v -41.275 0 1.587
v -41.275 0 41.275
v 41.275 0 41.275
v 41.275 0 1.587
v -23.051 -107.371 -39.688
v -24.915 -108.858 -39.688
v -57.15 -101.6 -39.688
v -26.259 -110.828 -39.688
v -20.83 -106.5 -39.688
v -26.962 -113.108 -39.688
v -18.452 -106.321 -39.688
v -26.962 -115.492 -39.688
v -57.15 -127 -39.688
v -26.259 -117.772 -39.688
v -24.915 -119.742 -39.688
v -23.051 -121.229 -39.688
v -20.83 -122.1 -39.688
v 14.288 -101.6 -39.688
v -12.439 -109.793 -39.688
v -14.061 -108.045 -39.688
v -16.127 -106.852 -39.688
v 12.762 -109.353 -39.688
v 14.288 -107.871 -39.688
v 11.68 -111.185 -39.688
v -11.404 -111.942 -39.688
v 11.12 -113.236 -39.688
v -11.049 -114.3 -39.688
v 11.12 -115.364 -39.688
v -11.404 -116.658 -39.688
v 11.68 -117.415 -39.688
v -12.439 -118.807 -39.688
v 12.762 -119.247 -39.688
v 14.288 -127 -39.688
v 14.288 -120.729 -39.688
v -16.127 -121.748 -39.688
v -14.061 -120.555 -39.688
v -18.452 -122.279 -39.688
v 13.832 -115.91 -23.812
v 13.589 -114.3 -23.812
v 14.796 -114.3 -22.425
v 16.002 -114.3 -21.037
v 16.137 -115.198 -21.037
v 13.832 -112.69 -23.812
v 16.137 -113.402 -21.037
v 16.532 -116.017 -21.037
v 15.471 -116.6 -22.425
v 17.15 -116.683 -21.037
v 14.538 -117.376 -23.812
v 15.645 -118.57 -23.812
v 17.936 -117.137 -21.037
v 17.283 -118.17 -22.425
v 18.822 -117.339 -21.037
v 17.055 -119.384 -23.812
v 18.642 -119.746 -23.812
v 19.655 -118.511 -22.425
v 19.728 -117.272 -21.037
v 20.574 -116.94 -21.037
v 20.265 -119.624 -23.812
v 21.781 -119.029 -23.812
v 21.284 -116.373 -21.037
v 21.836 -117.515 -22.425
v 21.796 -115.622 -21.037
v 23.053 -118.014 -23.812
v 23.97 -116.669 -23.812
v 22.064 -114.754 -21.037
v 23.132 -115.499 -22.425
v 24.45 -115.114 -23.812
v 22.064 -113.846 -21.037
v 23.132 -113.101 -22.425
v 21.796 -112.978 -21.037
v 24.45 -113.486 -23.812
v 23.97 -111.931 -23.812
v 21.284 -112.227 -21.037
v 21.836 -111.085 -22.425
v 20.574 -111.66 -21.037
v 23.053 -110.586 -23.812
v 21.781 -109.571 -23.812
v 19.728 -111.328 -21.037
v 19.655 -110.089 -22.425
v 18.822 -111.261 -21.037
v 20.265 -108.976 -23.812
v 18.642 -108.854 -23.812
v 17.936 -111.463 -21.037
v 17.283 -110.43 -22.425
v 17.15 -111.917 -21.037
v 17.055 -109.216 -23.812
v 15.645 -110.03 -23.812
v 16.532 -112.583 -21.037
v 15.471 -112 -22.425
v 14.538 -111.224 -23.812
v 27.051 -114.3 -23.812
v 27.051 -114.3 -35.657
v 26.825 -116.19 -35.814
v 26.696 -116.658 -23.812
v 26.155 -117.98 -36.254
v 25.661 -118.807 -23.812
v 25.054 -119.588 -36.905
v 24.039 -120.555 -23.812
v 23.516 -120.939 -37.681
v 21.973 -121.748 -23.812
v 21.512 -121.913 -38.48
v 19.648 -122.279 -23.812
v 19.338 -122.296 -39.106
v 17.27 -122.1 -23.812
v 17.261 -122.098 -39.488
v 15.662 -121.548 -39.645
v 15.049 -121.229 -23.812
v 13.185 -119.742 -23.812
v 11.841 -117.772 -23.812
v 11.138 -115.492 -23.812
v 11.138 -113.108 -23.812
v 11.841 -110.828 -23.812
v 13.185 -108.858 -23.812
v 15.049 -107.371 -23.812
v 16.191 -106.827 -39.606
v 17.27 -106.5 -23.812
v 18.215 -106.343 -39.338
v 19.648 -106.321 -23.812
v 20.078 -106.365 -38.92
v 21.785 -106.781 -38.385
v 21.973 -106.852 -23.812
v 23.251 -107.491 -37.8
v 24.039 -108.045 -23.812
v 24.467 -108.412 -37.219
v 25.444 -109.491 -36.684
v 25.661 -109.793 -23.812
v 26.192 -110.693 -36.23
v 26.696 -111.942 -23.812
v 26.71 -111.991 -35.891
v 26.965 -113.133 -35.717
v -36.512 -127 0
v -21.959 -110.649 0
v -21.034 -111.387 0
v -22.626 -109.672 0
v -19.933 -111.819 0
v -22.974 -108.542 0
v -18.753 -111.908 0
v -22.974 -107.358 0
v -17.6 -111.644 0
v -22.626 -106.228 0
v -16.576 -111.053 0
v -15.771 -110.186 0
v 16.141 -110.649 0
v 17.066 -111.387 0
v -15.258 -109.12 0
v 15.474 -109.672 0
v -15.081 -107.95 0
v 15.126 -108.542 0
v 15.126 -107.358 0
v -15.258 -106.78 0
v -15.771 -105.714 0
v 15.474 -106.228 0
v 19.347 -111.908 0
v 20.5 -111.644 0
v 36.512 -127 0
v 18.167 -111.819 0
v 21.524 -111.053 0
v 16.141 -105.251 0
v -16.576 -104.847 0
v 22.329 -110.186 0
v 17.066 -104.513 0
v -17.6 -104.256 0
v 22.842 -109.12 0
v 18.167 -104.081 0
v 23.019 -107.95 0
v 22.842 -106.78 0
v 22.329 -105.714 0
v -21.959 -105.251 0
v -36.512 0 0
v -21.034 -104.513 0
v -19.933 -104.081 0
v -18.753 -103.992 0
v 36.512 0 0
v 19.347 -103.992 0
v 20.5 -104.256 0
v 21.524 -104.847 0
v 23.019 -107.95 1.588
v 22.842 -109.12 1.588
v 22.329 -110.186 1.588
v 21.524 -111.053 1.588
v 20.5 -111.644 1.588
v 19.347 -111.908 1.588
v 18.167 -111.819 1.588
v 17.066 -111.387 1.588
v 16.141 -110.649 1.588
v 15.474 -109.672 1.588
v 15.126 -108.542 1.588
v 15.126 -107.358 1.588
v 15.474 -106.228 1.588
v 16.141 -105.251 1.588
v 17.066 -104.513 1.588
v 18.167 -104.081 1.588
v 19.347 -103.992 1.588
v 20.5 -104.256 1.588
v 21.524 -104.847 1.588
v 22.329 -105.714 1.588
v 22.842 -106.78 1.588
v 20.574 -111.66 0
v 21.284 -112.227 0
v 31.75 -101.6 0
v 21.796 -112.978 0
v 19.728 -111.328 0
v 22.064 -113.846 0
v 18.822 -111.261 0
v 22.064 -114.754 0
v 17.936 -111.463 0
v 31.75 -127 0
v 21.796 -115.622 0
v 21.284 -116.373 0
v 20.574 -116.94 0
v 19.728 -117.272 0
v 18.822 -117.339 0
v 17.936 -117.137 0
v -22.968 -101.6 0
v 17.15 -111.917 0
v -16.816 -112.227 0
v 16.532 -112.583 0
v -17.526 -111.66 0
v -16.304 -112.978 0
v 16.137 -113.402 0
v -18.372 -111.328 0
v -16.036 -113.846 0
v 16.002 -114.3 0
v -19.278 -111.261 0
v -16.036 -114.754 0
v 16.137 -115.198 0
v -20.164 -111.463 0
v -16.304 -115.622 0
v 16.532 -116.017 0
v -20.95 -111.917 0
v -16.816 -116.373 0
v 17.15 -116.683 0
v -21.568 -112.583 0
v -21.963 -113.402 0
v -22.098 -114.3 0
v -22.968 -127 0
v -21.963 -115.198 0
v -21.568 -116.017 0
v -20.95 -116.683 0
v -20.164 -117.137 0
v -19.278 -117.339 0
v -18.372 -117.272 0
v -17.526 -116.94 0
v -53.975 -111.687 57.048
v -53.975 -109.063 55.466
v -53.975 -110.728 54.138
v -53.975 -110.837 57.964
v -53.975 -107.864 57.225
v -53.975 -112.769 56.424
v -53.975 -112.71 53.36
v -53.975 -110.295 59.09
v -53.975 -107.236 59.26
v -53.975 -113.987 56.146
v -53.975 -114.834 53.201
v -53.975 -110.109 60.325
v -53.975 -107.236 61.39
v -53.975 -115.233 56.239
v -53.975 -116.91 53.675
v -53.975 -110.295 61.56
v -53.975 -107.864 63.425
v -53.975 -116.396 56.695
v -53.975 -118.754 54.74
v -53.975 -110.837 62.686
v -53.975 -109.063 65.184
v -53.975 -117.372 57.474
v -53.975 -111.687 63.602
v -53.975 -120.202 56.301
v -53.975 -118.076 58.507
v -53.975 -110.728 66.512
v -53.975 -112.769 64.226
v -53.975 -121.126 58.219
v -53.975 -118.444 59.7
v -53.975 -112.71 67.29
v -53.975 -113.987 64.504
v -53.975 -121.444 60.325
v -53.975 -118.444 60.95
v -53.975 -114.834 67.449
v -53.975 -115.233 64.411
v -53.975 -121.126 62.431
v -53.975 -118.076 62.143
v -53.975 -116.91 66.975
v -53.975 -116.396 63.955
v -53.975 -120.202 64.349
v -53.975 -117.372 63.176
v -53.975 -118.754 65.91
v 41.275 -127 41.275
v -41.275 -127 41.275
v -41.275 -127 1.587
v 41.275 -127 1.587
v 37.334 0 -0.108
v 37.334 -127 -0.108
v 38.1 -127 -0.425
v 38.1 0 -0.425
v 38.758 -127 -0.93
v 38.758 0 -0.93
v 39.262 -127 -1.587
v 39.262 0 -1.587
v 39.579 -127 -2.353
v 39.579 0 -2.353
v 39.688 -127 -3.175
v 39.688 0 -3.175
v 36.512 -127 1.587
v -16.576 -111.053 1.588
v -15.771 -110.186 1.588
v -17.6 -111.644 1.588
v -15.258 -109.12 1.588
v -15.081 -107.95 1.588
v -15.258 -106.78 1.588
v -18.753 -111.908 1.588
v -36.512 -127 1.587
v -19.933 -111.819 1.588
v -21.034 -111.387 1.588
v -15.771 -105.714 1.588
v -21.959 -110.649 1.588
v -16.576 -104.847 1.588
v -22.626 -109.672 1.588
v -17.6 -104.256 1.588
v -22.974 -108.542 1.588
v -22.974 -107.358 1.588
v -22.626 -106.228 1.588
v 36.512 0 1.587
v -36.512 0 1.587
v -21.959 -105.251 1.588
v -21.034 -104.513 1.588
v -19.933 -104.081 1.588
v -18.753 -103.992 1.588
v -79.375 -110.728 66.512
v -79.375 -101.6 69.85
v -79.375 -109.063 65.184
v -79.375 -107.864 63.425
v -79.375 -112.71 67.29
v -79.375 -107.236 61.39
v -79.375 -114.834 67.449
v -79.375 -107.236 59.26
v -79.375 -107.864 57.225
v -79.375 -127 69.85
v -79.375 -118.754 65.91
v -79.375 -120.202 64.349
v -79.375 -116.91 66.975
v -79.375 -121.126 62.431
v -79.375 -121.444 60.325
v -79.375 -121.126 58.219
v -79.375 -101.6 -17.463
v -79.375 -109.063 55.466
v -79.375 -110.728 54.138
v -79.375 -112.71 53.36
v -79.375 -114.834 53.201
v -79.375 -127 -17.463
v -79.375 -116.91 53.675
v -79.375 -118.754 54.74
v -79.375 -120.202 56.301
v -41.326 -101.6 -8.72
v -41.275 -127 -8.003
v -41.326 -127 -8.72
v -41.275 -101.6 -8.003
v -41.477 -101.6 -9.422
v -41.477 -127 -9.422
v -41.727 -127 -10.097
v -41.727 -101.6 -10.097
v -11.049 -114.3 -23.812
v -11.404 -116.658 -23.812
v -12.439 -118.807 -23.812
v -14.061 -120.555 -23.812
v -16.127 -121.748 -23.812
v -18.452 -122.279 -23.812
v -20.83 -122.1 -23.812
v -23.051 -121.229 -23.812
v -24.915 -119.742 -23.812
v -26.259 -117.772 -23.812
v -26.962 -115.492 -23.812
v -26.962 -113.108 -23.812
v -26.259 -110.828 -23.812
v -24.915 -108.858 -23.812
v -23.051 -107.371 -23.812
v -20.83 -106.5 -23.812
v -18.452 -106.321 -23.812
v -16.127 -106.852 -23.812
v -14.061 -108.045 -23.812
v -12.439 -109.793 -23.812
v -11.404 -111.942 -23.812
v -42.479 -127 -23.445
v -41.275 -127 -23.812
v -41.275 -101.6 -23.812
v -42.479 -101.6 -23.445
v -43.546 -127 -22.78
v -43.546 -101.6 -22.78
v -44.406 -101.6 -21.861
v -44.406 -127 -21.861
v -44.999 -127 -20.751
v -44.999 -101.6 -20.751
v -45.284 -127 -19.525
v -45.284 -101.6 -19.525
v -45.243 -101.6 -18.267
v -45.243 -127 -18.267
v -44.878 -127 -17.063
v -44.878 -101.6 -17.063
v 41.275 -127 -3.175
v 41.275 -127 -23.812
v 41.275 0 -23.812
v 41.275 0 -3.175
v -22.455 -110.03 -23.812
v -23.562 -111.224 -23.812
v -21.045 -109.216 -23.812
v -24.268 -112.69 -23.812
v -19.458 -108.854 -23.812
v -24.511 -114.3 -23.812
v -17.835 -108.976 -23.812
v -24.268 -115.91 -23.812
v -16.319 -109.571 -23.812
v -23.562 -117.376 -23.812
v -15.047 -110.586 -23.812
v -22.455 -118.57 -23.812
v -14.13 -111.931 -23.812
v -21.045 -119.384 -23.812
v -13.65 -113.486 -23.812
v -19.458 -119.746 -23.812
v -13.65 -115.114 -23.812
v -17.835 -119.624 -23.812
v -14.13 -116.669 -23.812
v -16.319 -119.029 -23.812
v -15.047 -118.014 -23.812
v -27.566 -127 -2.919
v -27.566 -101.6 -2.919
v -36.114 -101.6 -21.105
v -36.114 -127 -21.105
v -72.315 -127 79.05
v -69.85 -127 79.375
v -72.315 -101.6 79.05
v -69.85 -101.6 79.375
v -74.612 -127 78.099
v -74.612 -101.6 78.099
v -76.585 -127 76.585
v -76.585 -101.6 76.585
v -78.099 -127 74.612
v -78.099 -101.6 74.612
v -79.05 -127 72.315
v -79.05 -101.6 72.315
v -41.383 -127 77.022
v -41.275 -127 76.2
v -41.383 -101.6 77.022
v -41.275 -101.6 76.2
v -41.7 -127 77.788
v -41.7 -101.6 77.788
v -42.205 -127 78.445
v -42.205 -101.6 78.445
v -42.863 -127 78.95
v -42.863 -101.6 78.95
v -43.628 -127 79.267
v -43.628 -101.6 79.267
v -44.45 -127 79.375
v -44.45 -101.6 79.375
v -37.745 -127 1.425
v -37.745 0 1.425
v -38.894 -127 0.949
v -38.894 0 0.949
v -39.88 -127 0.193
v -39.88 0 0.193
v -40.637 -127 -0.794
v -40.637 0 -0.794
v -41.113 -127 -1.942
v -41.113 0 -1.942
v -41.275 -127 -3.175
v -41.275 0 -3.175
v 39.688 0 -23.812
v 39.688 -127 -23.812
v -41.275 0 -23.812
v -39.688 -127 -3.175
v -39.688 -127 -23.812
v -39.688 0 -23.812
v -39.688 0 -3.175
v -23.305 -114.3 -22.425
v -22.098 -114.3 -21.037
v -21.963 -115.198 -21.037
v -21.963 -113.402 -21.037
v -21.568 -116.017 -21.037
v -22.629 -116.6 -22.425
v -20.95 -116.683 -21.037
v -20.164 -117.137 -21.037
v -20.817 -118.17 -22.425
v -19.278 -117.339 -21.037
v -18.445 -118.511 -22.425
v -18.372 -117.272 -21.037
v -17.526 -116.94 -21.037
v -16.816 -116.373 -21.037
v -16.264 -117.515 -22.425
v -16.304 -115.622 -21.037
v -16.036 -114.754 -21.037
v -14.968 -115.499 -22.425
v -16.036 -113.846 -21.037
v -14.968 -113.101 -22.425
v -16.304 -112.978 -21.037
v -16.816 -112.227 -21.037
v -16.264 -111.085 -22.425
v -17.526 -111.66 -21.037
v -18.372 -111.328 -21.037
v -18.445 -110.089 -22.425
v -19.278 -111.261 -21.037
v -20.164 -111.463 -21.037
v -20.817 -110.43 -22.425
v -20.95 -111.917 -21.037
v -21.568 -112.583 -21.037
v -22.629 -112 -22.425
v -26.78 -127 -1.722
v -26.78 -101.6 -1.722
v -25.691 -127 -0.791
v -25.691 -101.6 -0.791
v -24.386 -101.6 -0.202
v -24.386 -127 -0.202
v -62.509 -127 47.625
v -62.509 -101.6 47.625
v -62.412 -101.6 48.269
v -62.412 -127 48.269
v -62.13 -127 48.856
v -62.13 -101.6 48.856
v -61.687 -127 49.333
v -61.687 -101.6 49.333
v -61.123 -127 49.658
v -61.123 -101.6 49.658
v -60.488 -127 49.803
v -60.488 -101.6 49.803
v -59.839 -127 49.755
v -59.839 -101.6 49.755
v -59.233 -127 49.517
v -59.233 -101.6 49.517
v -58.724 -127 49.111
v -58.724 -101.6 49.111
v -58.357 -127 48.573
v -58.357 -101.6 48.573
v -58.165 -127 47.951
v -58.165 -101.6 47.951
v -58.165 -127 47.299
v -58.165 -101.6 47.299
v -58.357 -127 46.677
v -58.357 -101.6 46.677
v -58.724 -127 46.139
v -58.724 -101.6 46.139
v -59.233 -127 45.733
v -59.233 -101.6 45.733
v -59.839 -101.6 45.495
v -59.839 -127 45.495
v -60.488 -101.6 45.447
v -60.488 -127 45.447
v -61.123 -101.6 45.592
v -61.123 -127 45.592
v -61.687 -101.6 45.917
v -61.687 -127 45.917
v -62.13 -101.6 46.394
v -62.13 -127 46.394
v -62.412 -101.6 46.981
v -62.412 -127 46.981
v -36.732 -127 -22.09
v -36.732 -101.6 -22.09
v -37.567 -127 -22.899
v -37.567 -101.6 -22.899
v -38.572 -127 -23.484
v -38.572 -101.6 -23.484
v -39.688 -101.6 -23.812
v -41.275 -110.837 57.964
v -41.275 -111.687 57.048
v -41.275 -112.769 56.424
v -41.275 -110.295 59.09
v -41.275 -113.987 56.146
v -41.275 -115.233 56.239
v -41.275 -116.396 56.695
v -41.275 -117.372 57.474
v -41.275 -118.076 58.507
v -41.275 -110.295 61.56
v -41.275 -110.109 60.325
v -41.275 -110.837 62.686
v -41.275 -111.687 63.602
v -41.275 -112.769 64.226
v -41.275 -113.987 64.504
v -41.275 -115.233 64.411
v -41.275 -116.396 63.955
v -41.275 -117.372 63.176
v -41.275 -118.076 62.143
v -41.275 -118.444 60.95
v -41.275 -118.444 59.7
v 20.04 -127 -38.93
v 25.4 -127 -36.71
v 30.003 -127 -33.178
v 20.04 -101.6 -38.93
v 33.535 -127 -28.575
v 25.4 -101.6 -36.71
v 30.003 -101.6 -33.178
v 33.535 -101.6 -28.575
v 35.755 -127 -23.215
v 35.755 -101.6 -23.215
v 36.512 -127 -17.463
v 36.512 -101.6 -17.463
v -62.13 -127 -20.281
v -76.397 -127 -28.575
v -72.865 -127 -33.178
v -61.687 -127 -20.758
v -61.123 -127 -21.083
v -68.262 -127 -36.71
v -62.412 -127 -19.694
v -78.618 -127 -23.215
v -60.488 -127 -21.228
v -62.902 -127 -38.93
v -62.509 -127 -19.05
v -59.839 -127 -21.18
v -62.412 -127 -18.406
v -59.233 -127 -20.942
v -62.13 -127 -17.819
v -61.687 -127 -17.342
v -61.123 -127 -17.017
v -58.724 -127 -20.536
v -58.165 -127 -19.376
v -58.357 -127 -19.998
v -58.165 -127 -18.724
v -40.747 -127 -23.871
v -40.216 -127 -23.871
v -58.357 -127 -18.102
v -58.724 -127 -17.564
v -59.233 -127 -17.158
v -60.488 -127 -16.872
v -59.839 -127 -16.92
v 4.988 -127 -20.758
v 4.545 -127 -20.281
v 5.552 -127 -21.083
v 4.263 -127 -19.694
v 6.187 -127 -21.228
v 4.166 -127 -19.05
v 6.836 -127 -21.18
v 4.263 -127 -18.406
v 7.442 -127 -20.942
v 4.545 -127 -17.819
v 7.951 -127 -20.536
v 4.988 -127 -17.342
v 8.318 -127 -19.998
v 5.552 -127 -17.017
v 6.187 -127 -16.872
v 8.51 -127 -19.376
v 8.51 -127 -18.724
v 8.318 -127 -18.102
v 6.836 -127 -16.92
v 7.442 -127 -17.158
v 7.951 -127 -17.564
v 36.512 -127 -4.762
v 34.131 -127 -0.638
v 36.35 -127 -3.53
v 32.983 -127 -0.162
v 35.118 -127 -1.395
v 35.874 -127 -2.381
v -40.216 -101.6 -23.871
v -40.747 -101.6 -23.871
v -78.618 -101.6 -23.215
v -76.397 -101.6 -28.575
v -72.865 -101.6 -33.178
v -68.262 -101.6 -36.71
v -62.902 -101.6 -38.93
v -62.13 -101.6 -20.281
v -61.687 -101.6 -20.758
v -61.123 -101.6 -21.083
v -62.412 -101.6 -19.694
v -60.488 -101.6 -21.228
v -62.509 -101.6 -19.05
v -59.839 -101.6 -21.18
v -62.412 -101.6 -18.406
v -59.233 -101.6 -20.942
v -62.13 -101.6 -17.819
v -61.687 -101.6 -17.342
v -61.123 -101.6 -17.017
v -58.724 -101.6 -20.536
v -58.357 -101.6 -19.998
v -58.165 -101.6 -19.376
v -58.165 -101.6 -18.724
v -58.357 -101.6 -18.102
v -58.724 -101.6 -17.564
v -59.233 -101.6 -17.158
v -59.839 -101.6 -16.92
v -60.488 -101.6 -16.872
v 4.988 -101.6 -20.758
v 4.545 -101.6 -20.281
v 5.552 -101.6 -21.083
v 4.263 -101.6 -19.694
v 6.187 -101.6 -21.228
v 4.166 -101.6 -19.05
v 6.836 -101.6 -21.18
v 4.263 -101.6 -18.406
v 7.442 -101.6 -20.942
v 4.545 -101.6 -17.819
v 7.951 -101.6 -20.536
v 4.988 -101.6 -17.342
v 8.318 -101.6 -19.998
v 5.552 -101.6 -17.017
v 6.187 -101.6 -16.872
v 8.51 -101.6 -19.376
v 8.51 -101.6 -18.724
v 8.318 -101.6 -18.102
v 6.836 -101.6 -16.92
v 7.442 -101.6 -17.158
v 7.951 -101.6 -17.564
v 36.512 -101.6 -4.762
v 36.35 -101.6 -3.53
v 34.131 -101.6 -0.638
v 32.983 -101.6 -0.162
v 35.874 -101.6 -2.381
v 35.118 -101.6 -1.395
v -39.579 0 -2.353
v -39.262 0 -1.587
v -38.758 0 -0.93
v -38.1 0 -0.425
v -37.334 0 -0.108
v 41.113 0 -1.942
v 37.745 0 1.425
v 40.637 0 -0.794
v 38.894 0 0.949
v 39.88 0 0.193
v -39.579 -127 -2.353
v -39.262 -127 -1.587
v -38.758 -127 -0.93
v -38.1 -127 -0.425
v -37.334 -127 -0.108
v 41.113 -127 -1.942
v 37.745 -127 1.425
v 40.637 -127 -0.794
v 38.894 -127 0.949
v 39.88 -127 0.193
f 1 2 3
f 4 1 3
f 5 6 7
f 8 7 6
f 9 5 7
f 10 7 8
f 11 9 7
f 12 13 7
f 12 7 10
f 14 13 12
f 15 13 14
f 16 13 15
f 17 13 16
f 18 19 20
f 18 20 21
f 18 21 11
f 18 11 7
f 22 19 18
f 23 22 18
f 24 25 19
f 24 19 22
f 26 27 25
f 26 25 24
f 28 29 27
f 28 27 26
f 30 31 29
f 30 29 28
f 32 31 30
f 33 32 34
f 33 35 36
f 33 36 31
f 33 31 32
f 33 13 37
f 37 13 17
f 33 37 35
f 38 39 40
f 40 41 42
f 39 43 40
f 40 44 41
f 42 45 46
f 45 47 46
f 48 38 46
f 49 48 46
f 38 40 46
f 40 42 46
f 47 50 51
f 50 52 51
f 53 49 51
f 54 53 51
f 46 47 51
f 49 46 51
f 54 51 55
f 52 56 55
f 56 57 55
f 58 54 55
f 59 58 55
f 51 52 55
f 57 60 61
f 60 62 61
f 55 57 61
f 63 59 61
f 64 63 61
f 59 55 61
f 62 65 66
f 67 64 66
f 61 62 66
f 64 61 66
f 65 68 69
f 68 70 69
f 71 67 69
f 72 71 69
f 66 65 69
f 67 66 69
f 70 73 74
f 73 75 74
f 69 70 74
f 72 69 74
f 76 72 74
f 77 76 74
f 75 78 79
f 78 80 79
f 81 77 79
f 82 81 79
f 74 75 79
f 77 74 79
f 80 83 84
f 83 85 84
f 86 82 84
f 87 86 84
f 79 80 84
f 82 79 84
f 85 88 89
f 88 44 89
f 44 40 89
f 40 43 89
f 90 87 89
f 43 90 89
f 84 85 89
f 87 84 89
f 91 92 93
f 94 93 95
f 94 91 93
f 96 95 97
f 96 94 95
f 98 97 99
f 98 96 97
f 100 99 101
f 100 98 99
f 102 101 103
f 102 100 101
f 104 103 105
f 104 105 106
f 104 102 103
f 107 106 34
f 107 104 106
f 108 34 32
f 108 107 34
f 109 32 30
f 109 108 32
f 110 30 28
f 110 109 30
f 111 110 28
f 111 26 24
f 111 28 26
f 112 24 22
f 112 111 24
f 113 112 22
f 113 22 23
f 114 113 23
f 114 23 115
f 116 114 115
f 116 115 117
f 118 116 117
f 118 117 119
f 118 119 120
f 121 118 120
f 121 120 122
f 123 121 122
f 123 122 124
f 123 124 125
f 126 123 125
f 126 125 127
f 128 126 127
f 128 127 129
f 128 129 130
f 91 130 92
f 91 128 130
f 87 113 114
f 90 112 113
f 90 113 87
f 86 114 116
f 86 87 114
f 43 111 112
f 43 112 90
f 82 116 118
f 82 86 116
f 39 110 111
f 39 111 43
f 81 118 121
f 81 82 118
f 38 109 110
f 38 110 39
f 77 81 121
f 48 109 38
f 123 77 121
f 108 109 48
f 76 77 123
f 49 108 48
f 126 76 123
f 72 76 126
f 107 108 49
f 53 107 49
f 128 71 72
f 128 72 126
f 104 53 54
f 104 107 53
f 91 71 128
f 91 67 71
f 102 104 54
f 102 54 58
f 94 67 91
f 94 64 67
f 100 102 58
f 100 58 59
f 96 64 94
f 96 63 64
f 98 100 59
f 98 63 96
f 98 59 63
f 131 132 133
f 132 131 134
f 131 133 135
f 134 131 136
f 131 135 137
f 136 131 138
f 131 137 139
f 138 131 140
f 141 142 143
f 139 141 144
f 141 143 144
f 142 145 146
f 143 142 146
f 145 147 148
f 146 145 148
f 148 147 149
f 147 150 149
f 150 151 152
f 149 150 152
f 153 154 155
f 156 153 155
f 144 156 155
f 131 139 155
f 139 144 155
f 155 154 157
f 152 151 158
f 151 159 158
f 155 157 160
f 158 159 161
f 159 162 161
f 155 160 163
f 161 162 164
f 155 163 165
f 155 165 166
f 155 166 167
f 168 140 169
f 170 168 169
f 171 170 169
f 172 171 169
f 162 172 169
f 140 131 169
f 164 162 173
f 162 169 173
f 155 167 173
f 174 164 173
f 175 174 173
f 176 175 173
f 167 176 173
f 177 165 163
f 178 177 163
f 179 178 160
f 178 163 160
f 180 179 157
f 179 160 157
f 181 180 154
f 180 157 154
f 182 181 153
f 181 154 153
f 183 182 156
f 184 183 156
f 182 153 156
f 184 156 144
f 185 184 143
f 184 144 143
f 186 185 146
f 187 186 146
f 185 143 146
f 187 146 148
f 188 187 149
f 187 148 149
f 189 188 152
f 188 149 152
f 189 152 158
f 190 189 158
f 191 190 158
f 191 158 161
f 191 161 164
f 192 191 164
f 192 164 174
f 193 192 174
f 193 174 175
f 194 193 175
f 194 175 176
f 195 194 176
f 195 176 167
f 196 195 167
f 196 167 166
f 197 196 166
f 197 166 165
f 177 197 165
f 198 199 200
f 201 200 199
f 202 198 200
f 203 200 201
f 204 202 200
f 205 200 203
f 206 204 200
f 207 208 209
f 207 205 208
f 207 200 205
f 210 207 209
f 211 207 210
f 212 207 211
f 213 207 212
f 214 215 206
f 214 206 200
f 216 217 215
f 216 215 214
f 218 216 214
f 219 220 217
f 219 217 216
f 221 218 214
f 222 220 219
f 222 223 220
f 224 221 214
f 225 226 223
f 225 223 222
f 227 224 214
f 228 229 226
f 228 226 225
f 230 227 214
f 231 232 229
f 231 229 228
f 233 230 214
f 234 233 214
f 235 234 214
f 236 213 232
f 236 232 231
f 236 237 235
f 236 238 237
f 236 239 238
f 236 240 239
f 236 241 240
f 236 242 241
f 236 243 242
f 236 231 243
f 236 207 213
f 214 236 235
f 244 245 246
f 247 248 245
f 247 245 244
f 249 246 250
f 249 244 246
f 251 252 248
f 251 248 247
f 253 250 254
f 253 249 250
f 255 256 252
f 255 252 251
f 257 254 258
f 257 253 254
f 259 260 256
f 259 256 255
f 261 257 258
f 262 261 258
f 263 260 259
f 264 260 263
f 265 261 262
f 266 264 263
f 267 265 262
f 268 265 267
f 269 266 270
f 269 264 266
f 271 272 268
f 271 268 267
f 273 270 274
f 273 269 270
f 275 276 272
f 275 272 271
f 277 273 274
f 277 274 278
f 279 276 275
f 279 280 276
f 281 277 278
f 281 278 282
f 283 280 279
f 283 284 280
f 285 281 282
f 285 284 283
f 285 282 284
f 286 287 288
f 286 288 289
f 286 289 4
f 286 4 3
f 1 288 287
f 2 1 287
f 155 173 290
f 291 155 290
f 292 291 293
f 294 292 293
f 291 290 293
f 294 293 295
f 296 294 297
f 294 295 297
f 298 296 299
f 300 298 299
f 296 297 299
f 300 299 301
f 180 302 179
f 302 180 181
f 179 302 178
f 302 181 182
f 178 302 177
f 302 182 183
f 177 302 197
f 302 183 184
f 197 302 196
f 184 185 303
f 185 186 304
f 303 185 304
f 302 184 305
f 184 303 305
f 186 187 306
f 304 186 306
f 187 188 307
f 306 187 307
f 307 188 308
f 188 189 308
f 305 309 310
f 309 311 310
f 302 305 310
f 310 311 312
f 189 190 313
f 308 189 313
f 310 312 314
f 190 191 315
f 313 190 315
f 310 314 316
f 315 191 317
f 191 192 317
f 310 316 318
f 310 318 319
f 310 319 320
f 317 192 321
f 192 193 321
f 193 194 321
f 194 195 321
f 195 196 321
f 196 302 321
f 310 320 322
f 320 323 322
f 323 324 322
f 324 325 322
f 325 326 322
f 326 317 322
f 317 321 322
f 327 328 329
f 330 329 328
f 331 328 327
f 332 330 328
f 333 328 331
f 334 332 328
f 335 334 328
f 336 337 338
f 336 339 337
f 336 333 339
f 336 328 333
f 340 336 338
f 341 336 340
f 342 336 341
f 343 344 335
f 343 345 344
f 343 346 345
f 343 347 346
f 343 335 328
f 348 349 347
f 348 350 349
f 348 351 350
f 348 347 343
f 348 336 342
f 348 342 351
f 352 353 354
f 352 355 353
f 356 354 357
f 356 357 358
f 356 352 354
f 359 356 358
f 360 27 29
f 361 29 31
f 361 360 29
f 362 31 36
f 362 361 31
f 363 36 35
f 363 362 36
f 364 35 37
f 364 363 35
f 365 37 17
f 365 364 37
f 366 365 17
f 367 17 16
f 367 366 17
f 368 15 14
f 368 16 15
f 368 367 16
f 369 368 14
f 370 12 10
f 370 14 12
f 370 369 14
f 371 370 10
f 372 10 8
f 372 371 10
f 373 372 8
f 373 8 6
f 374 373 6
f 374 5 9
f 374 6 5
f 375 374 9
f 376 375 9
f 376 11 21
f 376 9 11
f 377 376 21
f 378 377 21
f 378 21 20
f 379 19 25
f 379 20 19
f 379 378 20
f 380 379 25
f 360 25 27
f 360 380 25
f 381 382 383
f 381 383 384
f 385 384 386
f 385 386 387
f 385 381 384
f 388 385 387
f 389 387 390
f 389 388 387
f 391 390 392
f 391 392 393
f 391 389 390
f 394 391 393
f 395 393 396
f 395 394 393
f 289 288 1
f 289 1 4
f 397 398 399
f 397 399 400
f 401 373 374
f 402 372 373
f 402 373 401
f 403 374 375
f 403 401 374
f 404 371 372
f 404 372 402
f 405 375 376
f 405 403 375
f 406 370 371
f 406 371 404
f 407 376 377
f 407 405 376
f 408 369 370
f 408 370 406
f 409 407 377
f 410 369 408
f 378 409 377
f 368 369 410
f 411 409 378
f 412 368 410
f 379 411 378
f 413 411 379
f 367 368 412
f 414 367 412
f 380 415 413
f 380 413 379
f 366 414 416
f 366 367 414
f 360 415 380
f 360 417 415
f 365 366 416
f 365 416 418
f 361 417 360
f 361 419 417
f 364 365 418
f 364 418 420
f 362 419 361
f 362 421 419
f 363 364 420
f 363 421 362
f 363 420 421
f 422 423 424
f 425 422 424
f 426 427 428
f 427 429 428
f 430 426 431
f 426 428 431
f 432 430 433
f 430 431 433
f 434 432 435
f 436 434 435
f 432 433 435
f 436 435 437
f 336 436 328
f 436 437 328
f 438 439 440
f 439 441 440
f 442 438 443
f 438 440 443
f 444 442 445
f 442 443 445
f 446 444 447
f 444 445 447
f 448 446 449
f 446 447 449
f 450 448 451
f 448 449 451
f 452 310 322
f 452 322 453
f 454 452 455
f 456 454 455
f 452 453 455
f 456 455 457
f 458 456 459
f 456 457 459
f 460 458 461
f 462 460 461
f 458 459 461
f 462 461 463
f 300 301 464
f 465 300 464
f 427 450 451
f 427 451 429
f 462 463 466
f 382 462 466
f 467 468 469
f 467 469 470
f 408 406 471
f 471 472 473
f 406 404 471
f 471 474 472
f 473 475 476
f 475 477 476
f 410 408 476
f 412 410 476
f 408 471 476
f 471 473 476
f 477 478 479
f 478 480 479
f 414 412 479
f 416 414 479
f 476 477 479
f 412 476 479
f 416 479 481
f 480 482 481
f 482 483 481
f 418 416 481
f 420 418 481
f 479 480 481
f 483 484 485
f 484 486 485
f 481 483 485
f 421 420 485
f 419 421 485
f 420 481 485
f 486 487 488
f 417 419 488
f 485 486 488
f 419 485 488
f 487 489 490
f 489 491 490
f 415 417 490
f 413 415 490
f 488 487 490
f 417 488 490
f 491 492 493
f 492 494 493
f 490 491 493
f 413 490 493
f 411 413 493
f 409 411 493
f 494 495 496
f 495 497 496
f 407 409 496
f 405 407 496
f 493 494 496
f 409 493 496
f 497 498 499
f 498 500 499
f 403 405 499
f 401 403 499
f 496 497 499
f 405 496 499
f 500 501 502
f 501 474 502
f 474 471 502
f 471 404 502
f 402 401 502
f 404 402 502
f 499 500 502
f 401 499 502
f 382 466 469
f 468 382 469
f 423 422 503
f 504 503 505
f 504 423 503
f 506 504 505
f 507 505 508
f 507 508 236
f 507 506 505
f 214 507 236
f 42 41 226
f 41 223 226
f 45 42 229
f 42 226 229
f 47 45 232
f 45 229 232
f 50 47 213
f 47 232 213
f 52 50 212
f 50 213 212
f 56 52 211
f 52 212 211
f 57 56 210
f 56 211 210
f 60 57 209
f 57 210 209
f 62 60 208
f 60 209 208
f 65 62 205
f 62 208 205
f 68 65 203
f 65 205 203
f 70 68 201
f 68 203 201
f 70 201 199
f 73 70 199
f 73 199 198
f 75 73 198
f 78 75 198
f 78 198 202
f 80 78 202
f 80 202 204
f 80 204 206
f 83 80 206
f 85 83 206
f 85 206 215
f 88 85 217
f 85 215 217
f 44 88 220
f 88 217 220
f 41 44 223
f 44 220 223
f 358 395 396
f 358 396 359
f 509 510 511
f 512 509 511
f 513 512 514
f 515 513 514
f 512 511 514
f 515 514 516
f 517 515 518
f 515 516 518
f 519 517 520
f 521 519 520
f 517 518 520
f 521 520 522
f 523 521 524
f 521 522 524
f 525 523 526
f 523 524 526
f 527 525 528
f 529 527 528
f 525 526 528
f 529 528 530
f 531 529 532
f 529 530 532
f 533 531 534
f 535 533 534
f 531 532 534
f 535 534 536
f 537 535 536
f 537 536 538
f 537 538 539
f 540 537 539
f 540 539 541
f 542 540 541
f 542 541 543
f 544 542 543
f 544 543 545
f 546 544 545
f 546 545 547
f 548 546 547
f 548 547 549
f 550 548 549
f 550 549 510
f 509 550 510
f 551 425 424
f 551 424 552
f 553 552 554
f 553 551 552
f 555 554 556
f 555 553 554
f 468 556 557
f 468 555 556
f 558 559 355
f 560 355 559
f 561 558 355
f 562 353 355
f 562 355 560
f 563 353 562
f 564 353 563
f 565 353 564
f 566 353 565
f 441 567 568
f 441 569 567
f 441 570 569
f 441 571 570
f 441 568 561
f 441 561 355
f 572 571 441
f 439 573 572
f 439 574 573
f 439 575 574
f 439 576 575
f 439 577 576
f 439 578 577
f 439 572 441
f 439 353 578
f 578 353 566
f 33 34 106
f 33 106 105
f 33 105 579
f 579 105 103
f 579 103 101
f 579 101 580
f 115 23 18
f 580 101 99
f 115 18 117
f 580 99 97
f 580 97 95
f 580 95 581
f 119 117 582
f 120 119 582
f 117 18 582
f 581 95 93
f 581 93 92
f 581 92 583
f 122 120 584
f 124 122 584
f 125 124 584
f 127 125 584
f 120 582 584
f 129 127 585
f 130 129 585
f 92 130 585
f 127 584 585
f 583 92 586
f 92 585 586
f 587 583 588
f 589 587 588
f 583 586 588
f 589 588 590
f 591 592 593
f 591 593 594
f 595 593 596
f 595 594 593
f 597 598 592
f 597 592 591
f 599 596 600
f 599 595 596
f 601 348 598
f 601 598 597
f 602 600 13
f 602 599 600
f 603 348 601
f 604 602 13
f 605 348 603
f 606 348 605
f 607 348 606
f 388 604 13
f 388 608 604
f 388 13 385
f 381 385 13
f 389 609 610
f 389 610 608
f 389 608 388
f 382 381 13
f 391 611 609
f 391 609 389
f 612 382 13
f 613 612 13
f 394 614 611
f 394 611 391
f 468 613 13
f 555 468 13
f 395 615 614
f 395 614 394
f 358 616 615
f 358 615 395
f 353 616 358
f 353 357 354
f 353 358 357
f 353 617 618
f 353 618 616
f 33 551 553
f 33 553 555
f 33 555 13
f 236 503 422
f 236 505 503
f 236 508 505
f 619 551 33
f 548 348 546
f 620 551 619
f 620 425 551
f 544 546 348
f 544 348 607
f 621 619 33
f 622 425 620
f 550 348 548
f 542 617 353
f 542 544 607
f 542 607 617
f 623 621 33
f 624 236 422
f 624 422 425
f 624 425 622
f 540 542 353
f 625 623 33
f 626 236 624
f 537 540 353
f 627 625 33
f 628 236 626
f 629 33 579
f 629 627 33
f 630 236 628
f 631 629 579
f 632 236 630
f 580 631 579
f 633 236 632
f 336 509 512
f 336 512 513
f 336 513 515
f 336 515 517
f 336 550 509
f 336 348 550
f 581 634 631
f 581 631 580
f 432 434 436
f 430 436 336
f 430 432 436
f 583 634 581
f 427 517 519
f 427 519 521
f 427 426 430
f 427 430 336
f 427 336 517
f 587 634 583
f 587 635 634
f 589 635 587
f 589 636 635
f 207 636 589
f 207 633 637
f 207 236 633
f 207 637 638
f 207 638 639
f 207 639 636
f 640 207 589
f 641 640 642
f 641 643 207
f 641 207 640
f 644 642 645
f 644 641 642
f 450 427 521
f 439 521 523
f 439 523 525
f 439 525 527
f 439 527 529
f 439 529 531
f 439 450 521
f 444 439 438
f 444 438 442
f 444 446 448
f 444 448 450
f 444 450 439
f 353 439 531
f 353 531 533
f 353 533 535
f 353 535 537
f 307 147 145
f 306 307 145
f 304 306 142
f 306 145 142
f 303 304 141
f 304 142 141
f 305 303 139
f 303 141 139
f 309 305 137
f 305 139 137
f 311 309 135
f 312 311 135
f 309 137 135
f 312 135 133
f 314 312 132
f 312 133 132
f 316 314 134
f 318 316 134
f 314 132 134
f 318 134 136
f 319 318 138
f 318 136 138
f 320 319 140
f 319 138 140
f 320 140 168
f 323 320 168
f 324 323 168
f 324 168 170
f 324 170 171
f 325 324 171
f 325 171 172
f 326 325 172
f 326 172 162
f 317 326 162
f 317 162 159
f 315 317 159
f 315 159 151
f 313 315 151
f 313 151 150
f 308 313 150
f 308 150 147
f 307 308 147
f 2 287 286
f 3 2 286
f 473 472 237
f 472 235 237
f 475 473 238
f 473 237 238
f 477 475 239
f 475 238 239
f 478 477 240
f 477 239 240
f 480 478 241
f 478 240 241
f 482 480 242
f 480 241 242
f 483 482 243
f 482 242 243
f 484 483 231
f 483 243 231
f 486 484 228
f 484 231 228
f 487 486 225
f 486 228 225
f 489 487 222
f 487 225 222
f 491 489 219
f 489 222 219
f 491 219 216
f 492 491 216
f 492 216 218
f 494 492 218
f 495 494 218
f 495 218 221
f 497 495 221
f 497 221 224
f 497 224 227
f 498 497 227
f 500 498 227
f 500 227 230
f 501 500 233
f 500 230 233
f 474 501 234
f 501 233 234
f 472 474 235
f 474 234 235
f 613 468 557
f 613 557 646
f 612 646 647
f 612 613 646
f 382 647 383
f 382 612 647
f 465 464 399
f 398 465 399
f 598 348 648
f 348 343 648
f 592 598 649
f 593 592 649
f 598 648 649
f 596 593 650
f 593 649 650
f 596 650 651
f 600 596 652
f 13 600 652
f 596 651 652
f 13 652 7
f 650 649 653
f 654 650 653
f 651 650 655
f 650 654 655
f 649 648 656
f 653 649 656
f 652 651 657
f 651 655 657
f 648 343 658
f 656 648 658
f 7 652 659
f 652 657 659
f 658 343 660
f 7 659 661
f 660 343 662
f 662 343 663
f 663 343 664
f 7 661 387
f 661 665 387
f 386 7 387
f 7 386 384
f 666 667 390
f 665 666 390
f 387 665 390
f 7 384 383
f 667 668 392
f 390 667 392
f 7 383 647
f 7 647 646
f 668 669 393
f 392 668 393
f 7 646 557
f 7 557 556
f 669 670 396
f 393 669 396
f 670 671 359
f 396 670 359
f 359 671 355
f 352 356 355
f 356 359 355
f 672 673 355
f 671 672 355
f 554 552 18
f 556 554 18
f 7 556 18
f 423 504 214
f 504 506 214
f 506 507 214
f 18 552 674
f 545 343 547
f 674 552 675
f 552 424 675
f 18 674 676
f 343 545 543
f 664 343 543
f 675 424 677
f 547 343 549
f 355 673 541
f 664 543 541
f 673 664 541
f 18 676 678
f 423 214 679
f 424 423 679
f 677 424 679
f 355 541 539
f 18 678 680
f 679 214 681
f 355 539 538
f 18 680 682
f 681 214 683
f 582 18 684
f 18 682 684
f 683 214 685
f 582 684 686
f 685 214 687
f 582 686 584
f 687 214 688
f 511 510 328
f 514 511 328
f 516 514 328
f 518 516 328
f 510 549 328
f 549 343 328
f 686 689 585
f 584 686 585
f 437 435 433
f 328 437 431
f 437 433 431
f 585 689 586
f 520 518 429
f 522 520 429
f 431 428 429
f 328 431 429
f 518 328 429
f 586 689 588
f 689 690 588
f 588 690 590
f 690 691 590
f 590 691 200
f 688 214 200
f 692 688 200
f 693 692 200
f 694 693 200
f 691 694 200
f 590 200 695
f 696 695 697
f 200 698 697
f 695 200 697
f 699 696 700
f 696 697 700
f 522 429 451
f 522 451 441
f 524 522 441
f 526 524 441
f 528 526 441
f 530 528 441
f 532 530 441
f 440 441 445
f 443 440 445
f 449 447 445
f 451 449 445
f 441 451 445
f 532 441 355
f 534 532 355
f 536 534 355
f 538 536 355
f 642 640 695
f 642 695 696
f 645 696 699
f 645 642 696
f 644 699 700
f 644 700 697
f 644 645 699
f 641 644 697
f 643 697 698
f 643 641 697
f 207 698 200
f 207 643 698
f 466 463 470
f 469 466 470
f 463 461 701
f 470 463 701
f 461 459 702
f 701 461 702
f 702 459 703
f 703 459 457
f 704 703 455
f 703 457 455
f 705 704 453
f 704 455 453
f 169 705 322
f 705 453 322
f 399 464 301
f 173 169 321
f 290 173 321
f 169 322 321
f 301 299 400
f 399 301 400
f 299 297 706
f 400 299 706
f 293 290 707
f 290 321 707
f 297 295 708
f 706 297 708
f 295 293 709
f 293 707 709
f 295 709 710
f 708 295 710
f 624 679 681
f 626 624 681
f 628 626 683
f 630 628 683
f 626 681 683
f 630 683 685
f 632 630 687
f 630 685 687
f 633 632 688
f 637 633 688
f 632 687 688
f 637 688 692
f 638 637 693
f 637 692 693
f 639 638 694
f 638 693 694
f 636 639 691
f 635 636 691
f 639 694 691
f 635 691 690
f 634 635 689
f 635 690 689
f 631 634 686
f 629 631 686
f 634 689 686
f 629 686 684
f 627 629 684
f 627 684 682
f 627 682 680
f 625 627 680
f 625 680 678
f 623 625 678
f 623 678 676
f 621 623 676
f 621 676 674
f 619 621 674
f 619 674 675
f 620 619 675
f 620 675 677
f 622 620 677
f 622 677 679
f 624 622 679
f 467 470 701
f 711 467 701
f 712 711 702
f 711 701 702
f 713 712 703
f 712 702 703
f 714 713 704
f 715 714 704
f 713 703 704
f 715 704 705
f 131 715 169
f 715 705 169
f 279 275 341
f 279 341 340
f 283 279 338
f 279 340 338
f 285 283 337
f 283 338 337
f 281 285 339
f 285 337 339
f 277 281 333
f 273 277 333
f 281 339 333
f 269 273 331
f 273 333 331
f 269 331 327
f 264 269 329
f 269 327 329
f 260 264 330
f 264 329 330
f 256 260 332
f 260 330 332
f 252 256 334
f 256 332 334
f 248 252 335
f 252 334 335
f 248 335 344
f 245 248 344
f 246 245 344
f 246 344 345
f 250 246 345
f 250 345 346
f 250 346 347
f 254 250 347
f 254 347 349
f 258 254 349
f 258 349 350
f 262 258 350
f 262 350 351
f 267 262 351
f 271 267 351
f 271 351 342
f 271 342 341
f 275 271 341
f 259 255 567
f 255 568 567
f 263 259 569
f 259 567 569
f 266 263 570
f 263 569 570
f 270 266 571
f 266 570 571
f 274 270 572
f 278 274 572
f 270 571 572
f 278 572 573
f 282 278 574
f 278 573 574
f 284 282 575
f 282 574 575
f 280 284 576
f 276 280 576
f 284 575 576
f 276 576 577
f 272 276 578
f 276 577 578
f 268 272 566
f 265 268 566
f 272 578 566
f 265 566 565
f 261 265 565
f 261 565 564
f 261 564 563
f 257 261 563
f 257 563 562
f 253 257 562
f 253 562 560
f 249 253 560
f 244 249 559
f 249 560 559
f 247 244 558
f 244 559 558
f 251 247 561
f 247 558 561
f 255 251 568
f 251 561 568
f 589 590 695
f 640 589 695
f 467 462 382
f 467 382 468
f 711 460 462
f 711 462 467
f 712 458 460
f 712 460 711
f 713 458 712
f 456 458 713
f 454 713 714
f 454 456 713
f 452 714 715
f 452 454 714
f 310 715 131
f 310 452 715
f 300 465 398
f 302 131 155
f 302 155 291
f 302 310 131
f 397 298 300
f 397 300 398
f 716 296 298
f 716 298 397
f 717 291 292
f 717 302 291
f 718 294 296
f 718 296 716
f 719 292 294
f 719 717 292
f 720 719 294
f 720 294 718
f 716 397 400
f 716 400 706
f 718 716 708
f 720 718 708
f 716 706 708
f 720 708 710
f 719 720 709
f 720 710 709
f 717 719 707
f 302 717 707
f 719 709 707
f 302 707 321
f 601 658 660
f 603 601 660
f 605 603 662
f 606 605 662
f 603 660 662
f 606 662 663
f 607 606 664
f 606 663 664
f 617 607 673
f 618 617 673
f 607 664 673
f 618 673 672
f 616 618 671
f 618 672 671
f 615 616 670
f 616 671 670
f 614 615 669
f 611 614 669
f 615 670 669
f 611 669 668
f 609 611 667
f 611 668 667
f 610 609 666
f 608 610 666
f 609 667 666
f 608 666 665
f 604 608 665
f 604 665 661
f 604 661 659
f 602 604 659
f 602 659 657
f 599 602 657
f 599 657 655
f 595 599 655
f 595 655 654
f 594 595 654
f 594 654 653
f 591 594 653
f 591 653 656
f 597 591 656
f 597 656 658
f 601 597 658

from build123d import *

# Parameters (mm, degrees)
F1_DEPTH        = 127
F2_W            = 82.55
F2_H            = 39.6875
F3_DEPTH        = 127
F4_R            = 3.96875
F5_DEPTH        = 25.4
F7_DEPTH        = 25.4
F8_R            = 22.225
F10_R           = 8.001
F11_DEPTH       = 25.4
F12_D           = 6.096
F12_CSINK_D     = 10.922
F12_CSINK_ANGLE = 82
F13_R           = 3.175
F14_R           = 9.525
F16_D           = 8.382
F16_CBORE_D     = 14.2875
F16_CBORE_DEPTH = 25.4
F17_R           = 5.08
F18_R           = 2.1844
F19_DEPTH       = 25.4010001


with BuildPart() as f1:
    # F0 (on Front) → F1 (new body)
    with BuildSketch(Plane.XZ):
        with BuildLine():
            Line((39.6875, -23.8125), (41.275, -23.8125))
            Line((41.275, -23.8125), (41.275, -3.175))
            ThreePointArc((41.275, -3.175), (39.8800960454, 0.1925960454), (36.5125, 1.5875))
            Line((36.5125, 1.5875), (-36.5125, 1.5875))
            ThreePointArc((-36.5125, 1.5875), (-39.8800960454, 0.1925960454), (-41.275, -3.175))
            Line((-41.275, -3.175), (-41.275, -23.8125))
            Line((-41.275, -23.8125), (-39.6875, -23.8125))
            Line((-39.6875, -23.8125), (-39.6875, -3.175))
            ThreePointArc((-39.6875, -3.175), (-38.7575640303, -0.9299359697), (-36.5125, 0))
            Line((-36.5125, 0), (36.5125, 0))
            ThreePointArc((36.5125, 0), (38.7575640303, -0.9299359697), (39.6875, -3.175))
            Line((39.6875, -3.175), (39.6875, -23.8125))
        make_face()
    extrude(amount=F1_DEPTH)

    # F4 (on face) → F5 (cut)
    with BuildSketch(Plane(origin=(0, 0, 0), x_dir=(1, 0, 0), z_dir=(0, 0, -1))):
        with Locations((-19.05, 107.95)):
            Circle(F4_R)
        with Locations((19.05, 107.95)):
            Circle(F4_R)
    extrude(amount=-F5_DEPTH, mode=Mode.SUBTRACT)


with BuildPart() as f3:
    # F2 (on face) → F3 (new body, through all)
    with BuildSketch(Plane.XZ.offset(127)):
        with Locations((0, 21.43125)):
            Rectangle(F2_W, F2_H)
    extrude(amount=-F3_DEPTH)


with BuildPart() as f7:
    # F6 (on face) → F7 (new body)
    with BuildSketch(Plane.XZ.offset(127)):
        with BuildLine():
            Line((-41.275, -3.175), (-41.275, 79.375))
            Line((-41.275, 79.375), (-79.375, 79.375))
            Line((-79.375, 79.375), (-79.375, -39.6875))
            Line((-79.375, -39.6875), (36.5125, -39.6875))
            Line((36.5125, -39.6875), (36.5125, -4.7625))
            ThreePointArc((36.5125, -4.7625), (35.1175960454, -1.3949039546), (31.75, 0))
            Line((31.75, 0), (-26.19375, 0))
            Line((-26.19375, 0), (-36.1136453021, -21.1051003173))
            ThreePointArc((-36.1136453021, -21.1051003173), (-37.5670779324, -22.8990239183), (-39.6875, -23.8125))
            ThreePointArc((-39.6875, -23.8125), (-40.48125, -23.8782230188), (-41.275, -23.8125))
            ThreePointArc((-41.275, -23.8125), (-44.7385710396, -21.3249952393), (-44.8782165057, -17.063011731))
            Line((-44.8782165057, -17.063011731), (-41.275, -9.0984368335))
            Line((-41.275, -9.0984368335), (-41.275, -3.175))
        make_face()
    extrude(amount=-F7_DEPTH)

    # F8
    f8_edges = [f7.edges().sort_by_distance(p)[0] for p in [
        (-79.375, -114.3, -39.6875),
        (36.5125, -114.3, -39.6875),
    ]]
    fillet(f8_edges, radius=F8_R)

    # F10 (on offset) → F11 (cut)
    with BuildSketch(Plane(origin=(0, 0, -23.8125), x_dir=(1, 0, 0), z_dir=(0, 0, -1))):
        with Locations((-19.05, 114.3)):
            Circle(F10_R)
        with Locations((19.05, 114.3)):
            Circle(F10_R)
    extrude(amount=F11_DEPTH, mode=Mode.SUBTRACT)

    # F12 (through all)
    with Locations(Plane(origin=(0, 0, -23.8125), x_dir=(1, 0, 0), z_dir=(0, 0, -1))):
        with Locations((-19.05, 114.3), (19.05, 114.3)):
            CounterSinkHole(F12_D / 2, F12_CSINK_D / 2, counter_sink_angle=F12_CSINK_ANGLE)

    # F13
    f13_edges = [f7.edges().sort_by_distance(p)[0] for p in [
        (-41.275, -114.3, 79.375),
    ]]
    fillet(f13_edges, radius=F13_R)

    # F14
    f14_edges = [f7.edges().sort_by_distance(p)[0] for p in [
        (-79.375, -114.3, 79.375),
    ]]
    fillet(f14_edges, radius=F14_R)

    # F16 (through all)
    with Locations(Plane(origin=(-79.375, 0, 0), x_dir=(0, -1, 0), z_dir=(-1, 0, 0))):
        with Locations((114.3, 60.325)):
            CounterBoreHole(F16_D / 2, F16_CBORE_D / 2, F16_CBORE_DEPTH)

    # F17
    f17_edges = [f7.edges().sort_by_distance(p)[0] for p in [
        (-41.275, -114.3, -9.098437),
        (-26.19375, -114.3, 0),
    ]]
    fillet(f17_edges, radius=F17_R)

    # F18 (on face) → F19 (cut, through all)
    with BuildSketch(Plane(origin=(0, -101.6, 0), x_dir=(-1, 0, 0), z_dir=(0, 1, 0))):
        with Locations((60.325, 47.625)):
            Circle(F18_R)
        with Locations((60.325, -19.05)):
            Circle(F18_R)
        with Locations((-6.35, -19.05)):
            Circle(F18_R)
    extrude(amount=-F19_DEPTH, mode=Mode.SUBTRACT)


solid = Compound([f1.part, f3.part, f7.part])
